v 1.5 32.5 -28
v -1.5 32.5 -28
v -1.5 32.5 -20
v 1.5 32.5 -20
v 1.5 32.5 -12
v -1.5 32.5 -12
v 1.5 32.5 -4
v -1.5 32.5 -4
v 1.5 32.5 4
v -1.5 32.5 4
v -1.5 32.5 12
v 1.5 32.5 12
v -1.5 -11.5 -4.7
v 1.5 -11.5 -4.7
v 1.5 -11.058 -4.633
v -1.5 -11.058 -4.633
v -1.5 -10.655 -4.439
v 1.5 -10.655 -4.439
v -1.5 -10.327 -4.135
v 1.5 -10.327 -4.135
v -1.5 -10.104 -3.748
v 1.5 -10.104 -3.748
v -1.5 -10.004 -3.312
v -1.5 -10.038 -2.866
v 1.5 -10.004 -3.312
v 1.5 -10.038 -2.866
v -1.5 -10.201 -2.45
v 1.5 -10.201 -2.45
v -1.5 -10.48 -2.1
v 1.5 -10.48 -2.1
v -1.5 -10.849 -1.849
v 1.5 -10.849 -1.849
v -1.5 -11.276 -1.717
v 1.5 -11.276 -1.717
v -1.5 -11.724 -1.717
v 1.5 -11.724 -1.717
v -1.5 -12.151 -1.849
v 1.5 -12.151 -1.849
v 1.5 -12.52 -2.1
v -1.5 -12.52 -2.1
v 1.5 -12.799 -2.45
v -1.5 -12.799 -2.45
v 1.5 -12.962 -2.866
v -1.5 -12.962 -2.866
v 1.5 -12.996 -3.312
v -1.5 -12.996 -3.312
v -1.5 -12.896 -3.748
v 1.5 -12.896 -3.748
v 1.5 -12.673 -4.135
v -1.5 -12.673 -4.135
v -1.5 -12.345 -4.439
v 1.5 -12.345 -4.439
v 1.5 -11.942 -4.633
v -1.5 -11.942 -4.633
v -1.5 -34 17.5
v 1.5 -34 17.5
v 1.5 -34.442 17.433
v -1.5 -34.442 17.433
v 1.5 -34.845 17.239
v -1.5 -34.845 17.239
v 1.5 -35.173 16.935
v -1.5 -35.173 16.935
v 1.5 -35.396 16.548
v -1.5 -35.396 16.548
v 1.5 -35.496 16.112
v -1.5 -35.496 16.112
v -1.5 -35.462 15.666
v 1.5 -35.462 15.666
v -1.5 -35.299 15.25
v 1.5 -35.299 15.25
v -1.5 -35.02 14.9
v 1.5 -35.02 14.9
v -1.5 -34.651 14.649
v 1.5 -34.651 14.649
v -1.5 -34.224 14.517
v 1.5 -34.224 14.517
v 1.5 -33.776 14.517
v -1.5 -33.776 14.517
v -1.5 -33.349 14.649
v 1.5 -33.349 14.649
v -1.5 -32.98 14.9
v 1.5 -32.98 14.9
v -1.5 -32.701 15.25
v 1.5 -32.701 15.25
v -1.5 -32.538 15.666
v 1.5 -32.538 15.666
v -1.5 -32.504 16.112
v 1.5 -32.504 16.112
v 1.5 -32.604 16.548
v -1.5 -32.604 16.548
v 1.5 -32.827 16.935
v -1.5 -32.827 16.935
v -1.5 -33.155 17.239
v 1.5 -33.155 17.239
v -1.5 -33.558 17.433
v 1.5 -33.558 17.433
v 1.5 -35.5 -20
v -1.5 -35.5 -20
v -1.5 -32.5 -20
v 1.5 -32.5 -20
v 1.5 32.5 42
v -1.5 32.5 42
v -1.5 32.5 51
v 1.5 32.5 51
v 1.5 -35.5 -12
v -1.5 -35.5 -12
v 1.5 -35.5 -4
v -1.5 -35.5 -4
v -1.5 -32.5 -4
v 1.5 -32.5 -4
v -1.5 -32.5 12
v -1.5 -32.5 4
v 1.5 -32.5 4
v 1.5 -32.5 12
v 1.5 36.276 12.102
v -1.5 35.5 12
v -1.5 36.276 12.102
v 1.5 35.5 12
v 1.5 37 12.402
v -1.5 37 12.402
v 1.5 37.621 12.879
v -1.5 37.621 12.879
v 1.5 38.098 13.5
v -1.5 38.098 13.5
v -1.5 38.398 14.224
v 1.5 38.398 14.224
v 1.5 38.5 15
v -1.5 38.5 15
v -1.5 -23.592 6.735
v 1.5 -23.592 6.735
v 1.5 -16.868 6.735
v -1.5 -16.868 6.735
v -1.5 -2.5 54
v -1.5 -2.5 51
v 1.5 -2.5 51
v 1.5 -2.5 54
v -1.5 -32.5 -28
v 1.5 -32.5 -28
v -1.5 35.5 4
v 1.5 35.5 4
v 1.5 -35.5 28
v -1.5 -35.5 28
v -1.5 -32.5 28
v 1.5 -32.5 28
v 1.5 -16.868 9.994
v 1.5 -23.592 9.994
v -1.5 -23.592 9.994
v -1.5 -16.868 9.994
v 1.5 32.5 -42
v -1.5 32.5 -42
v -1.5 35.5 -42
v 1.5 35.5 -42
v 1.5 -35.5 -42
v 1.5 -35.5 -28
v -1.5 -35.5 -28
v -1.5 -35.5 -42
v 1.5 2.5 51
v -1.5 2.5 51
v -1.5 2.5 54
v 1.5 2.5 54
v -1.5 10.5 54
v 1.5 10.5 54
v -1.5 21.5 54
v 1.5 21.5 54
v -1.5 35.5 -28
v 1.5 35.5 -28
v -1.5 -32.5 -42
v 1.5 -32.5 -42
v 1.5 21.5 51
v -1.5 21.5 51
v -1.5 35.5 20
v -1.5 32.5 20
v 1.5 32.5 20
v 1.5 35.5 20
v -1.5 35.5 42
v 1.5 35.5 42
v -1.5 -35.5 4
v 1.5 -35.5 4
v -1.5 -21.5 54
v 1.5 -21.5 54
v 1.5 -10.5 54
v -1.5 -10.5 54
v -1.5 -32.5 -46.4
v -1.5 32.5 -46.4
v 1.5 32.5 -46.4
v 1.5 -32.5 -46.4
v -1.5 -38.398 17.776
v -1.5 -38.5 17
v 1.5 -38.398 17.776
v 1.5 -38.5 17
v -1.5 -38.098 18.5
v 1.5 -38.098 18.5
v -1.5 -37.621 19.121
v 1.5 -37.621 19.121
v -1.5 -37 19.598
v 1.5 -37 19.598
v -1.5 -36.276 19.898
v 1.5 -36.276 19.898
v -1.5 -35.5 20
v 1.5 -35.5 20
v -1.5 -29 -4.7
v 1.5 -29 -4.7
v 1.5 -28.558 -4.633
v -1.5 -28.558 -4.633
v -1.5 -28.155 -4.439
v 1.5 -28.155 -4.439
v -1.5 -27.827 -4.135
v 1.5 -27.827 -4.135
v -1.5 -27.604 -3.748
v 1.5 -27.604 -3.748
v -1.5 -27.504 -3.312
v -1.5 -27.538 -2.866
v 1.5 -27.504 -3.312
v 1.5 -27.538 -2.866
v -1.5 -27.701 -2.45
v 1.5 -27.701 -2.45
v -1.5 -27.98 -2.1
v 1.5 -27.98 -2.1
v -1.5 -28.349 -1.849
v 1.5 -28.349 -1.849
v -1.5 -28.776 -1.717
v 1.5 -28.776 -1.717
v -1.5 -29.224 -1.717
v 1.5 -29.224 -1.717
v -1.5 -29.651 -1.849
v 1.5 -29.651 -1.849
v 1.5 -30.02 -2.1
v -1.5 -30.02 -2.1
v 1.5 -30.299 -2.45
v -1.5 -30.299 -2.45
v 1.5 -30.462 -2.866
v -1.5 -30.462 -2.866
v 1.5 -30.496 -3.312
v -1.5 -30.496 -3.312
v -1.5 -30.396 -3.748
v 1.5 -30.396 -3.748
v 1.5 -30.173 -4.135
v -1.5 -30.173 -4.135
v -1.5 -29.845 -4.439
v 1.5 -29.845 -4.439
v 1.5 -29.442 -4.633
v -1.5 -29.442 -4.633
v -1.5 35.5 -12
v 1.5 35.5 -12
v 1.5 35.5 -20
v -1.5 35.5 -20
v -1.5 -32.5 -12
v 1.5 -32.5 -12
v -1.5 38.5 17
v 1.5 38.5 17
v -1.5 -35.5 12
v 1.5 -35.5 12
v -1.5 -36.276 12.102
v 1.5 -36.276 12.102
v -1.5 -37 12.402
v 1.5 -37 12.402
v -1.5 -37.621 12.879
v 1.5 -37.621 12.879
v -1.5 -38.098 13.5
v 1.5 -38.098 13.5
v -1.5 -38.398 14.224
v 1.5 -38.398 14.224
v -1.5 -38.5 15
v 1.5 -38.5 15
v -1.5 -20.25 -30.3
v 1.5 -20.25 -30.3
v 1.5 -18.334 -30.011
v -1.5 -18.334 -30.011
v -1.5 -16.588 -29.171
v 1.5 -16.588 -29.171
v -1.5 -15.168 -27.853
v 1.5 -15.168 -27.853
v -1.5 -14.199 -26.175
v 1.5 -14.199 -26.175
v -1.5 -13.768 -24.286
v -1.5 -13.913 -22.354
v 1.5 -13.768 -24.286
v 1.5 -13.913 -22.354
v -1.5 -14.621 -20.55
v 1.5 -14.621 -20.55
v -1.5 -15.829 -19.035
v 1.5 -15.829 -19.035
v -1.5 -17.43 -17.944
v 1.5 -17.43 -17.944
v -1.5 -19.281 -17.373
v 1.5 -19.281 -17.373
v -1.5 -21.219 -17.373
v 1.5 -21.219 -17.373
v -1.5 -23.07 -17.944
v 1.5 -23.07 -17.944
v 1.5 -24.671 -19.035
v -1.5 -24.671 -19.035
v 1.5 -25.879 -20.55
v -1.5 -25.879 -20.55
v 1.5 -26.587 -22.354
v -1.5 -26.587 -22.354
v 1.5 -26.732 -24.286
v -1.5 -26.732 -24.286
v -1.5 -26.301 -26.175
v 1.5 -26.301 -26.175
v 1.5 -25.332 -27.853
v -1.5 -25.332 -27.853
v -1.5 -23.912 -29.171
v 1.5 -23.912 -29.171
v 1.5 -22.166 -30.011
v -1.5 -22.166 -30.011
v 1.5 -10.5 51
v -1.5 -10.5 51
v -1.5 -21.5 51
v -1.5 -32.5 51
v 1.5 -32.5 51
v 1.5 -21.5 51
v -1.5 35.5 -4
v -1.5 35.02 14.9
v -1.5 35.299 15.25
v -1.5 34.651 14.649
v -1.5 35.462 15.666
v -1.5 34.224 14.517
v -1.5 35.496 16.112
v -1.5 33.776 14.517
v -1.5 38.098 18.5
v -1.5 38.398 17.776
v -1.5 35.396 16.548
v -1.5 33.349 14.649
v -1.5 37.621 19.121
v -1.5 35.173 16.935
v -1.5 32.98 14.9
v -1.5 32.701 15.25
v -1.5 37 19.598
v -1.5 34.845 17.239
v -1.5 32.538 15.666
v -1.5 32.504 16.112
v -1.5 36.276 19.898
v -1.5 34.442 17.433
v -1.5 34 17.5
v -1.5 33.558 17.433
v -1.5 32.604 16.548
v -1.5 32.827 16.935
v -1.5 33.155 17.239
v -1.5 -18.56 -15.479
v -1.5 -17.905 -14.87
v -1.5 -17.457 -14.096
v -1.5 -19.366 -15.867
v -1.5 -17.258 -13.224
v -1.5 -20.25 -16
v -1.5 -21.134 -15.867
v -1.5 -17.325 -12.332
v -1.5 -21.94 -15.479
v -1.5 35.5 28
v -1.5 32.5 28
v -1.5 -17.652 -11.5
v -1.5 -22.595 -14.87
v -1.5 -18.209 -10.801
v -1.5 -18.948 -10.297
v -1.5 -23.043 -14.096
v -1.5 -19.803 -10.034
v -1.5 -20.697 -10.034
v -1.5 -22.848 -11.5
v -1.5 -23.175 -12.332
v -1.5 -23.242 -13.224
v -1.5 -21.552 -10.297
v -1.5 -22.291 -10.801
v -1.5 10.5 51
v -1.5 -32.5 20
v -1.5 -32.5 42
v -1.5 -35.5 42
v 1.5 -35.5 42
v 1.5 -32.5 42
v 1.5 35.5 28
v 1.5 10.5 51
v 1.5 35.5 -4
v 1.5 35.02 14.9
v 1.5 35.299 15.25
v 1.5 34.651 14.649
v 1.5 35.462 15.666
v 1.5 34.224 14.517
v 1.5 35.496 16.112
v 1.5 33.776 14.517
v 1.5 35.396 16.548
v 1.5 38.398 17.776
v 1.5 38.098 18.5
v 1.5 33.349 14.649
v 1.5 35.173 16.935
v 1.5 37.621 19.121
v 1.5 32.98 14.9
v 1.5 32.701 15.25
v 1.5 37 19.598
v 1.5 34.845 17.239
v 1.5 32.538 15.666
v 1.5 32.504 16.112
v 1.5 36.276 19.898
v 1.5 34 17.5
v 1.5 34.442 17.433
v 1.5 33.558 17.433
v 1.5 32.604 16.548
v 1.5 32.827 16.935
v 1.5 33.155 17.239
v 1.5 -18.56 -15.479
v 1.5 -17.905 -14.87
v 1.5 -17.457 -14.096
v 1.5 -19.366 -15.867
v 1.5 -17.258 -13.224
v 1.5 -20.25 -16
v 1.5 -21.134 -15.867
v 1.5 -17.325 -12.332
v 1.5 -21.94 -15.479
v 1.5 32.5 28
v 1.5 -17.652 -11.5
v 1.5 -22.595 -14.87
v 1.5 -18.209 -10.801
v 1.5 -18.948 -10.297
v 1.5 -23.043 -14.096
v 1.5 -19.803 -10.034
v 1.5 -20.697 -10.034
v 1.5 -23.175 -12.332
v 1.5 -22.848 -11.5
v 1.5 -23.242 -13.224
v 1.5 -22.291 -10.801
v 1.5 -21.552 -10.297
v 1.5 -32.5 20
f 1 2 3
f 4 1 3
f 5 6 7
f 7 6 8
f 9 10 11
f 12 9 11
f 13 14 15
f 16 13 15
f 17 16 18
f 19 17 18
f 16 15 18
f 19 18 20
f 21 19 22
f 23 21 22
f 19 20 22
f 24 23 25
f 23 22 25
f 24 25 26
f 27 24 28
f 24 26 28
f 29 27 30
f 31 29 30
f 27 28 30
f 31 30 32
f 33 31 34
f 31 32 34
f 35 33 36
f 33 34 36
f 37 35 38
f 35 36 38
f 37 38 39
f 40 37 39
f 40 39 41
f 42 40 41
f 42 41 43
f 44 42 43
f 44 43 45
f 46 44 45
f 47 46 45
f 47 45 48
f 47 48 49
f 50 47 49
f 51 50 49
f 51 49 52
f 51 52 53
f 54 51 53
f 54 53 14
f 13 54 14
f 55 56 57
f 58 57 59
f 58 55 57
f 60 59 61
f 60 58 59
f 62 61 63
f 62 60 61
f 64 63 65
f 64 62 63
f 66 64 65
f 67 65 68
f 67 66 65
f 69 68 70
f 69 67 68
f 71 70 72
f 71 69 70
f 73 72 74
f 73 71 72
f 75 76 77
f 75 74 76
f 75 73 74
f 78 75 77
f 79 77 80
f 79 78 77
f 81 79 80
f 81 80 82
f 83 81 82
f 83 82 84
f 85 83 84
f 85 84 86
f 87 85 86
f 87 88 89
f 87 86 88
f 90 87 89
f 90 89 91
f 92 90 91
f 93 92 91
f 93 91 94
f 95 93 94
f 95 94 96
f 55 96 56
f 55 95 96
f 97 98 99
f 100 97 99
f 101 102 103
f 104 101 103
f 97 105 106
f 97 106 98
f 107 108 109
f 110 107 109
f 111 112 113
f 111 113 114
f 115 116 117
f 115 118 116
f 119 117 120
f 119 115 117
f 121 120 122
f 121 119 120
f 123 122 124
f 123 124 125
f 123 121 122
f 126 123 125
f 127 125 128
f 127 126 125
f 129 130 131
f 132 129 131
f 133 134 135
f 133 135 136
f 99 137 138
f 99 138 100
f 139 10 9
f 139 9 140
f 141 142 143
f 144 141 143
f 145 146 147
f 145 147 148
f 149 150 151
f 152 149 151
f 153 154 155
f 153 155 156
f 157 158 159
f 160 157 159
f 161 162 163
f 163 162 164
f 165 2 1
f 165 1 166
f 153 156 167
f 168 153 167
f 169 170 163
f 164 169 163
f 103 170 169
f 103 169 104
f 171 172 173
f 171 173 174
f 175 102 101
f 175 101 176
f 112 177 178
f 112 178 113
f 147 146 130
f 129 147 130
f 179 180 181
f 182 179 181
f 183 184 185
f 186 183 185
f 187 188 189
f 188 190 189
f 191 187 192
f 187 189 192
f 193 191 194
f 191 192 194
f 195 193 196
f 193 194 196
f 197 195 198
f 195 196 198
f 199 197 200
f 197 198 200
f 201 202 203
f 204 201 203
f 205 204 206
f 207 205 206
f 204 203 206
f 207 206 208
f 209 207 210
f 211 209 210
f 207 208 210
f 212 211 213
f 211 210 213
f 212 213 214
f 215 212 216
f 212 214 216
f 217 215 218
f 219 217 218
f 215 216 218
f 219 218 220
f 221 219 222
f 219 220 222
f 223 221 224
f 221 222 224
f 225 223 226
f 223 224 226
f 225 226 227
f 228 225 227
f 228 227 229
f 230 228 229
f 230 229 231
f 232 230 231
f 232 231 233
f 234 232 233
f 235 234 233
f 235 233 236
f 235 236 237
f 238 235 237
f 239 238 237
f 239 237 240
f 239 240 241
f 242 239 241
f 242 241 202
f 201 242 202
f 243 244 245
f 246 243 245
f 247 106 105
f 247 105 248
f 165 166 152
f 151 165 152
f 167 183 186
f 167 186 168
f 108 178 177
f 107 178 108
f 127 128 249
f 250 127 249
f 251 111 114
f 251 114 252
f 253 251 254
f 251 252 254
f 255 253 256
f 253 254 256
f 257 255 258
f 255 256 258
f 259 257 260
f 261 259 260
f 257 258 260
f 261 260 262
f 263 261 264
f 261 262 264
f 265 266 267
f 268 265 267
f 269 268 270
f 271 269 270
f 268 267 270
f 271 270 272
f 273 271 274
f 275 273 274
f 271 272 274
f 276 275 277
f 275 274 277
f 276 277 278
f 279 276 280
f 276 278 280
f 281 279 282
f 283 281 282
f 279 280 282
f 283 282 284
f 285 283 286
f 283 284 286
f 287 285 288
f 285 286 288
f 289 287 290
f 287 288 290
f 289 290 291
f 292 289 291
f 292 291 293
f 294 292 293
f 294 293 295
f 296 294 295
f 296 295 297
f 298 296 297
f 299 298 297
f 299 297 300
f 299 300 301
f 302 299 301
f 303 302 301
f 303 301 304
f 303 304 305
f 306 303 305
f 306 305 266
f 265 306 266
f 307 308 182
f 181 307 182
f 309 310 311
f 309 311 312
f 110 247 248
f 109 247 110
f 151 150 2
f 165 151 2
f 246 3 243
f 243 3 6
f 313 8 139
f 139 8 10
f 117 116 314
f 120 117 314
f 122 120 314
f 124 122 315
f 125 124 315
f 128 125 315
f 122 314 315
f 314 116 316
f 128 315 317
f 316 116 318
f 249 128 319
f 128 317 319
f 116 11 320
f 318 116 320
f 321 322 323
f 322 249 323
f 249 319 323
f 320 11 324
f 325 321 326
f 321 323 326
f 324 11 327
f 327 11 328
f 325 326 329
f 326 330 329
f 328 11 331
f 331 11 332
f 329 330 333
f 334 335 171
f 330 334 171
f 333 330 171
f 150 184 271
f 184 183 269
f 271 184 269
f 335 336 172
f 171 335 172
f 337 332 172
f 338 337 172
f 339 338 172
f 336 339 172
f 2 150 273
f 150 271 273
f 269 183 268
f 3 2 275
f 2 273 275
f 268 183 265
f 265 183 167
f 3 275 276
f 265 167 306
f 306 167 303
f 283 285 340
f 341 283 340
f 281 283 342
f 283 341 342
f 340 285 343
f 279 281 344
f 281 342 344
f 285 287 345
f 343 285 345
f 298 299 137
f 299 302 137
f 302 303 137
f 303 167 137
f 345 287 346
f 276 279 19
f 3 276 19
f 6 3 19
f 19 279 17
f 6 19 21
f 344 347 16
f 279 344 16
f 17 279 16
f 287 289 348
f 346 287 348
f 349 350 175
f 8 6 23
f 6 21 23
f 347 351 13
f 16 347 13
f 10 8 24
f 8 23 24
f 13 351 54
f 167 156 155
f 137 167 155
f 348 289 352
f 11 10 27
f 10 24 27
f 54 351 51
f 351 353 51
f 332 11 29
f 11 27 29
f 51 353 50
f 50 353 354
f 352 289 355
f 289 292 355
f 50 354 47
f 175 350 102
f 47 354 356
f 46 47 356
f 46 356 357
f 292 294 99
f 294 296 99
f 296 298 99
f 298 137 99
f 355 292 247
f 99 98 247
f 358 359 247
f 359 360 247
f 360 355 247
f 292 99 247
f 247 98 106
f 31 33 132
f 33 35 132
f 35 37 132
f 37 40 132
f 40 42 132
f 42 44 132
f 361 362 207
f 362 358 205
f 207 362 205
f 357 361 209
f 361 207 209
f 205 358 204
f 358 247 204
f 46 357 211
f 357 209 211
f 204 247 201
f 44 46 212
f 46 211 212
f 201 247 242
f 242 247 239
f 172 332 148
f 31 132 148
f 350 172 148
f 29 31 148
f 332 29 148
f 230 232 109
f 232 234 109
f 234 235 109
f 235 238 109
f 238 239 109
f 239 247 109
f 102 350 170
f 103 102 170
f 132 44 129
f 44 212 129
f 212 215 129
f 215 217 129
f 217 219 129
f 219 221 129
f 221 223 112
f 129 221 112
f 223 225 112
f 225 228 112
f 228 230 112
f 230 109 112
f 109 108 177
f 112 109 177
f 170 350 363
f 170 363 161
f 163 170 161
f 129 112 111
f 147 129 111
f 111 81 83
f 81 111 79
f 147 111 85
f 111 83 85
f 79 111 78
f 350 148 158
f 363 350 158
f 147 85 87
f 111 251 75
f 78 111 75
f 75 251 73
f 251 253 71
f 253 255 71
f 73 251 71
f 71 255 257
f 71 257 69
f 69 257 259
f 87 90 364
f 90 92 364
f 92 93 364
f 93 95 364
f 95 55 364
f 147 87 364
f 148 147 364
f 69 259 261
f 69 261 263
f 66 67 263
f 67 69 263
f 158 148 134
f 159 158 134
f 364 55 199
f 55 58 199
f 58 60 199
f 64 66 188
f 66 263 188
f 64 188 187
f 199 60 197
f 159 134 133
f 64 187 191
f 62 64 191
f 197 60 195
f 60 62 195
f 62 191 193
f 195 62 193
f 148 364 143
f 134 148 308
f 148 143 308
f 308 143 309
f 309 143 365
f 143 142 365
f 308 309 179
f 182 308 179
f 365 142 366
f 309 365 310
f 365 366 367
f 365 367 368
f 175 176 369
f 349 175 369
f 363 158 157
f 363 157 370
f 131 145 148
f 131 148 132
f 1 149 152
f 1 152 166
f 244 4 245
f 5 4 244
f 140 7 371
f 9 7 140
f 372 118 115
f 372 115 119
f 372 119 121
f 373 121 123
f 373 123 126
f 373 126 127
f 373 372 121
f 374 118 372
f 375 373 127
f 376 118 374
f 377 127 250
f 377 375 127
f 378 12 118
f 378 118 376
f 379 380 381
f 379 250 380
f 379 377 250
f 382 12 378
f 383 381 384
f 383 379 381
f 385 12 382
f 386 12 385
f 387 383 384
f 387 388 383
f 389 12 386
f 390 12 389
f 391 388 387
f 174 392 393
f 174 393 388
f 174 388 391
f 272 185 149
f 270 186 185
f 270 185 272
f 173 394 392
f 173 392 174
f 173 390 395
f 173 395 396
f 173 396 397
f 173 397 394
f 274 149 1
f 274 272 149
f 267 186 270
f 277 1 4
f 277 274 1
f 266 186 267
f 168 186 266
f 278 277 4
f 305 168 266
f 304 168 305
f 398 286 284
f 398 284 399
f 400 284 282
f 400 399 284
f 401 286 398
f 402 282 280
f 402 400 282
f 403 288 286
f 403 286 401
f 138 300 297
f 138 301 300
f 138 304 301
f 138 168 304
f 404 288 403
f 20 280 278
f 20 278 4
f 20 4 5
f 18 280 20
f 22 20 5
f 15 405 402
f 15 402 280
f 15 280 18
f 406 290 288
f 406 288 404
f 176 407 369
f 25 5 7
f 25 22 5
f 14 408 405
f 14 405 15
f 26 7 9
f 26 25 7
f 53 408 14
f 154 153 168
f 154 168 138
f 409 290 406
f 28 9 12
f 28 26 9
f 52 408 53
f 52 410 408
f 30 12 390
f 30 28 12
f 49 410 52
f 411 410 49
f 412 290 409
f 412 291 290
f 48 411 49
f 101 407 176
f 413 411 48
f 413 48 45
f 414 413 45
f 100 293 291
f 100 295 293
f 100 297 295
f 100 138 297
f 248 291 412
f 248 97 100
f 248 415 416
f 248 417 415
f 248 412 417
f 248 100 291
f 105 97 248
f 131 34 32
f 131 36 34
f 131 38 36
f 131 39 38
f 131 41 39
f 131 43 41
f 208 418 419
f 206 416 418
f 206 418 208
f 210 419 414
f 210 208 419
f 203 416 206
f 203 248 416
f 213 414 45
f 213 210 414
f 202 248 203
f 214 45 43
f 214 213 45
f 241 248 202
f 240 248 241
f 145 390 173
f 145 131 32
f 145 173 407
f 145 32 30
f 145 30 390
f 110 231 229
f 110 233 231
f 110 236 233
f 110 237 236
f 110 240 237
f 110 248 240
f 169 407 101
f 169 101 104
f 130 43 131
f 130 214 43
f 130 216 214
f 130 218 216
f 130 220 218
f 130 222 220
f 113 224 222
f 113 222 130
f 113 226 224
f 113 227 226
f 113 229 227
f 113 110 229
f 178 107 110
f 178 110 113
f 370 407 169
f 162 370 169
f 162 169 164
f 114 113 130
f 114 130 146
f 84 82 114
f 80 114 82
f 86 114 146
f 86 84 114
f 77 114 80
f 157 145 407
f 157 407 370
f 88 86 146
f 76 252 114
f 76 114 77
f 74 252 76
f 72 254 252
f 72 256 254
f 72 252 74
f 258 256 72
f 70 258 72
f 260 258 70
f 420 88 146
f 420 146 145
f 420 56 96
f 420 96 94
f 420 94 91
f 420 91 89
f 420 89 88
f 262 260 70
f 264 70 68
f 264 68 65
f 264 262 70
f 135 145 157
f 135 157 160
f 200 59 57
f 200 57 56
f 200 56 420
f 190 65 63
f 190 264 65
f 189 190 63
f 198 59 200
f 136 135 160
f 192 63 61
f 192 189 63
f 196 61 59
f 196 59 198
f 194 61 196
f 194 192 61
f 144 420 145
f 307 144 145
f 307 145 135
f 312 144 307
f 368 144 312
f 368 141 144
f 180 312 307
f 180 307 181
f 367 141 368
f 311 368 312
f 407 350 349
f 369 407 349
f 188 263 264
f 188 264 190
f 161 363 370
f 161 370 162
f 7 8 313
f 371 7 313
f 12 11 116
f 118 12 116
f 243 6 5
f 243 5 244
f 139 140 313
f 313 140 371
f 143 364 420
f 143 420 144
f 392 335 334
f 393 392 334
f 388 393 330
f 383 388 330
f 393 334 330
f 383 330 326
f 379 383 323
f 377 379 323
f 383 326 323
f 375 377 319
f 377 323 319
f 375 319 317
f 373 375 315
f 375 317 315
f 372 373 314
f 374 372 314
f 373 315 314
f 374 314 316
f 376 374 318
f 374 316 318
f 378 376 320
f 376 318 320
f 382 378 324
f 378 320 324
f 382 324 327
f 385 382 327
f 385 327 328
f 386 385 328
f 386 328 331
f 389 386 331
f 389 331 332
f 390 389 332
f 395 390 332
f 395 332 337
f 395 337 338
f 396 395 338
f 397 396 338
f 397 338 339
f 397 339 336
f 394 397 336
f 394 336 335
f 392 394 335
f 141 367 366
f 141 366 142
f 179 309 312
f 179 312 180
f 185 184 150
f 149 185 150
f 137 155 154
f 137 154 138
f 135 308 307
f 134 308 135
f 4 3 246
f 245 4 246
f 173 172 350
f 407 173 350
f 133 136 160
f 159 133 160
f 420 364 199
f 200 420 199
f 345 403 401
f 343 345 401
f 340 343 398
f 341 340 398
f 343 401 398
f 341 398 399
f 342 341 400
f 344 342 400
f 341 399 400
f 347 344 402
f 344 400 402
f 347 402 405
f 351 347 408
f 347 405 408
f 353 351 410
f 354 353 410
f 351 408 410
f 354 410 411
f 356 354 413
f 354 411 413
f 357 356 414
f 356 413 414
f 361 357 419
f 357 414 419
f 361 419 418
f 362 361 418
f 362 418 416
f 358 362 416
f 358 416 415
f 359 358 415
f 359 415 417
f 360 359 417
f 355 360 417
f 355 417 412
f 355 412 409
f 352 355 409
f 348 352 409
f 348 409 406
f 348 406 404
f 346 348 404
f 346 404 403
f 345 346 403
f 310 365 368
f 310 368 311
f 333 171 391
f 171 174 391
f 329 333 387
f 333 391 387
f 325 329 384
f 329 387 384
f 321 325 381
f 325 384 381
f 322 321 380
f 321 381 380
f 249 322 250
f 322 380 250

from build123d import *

# Parameters (mm, degrees)
CROQUIS1_W               = 108
CROQUIS1_H               = 71
SALIENTE_EXTRUIR1_DEPTH  = 1.5
CROQUIS2_W               = 12
CROQUIS2_H               = 3
CROQUIS2_W_2             = 8
CORTAR_EXTRUIR1_DEPTH    = 3
CROQUIS4_W               = 8
CROQUIS4_H               = 3
SALIENTE_EXTRUIR2_DEPTH  = 3
REDONDEO1_R              = 3
CROQUIS5_R               = 1.5
CORTAR_EXTRUIR2_DEPTH    = 13
REDONDEO1_OF_SIMETR_A2_R = 3
CROQUIS6_W               = 3
CROQUIS6_H               = 14
CROQUIS6_H_2             = 8
CORTAR_EXTRUIR3_DEPTH    = 3
CROQUIS7_W               = 3.217414859
CROQUIS7_H               = 7.6
CORTAR_EXTRUIR4_DEPTH    = 73
CROQUIS8_R               = 6.5
CROQUIS8_R_2             = 3
CROQUIS8_R_3             = 1.5
CROQUIS8_W               = 3.259373519
CROQUIS8_H               = 6.723882433
CORTAR_EXTRUIR5_DEPTH    = 23


with BuildPart() as part:
    # Croquis1 → Saliente-Extruir1 (new, symmetric)
    with BuildSketch(Plane(origin=(0, 0, 0), x_dir=(0, 0, -1), z_dir=(1, 0, 0))):
        Rectangle(CROQUIS1_W, CROQUIS1_H)
    extrude(amount=SALIENTE_EXTRUIR1_DEPTH, both=True)

    # Croquis2 → Cortar-Extruir1 (cut)
    with BuildSketch(Plane.ZY.offset(1.5)):
        with Locations((-48, -34)):
            Rectangle(CROQUIS2_W, CROQUIS2_H)
        with Locations((-24, -34)):
            Rectangle(CROQUIS2_W_2, CROQUIS2_H)
        with Locations((-8, -34)):
            Rectangle(CROQUIS2_W_2, CROQUIS2_H)
        with Locations((8, -34)):
            Rectangle(CROQUIS2_W_2, CROQUIS2_H)
        with Locations((24, -34)):
            Rectangle(CROQUIS2_W_2, CROQUIS2_H)
        with Locations((48, -34)):
            Rectangle(CROQUIS2_W, CROQUIS2_H)
        with Locations((48, 34)):
            Rectangle(CROQUIS2_W, CROQUIS2_H)
        with Locations((24, 34)):
            Rectangle(CROQUIS2_W_2, CROQUIS2_H)
        with Locations((8, 34)):
            Rectangle(CROQUIS2_W_2, CROQUIS2_H)
        with Locations((-8, 34)):
            Rectangle(CROQUIS2_W_2, CROQUIS2_H)
        with Locations((-24, 34)):
            Rectangle(CROQUIS2_W_2, CROQUIS2_H)
        with Locations((-48, 34)):
            Rectangle(CROQUIS2_W, CROQUIS2_H)
    extrude(amount=-CORTAR_EXTRUIR1_DEPTH, mode=Mode.SUBTRACT)

    # Croquis4 → Saliente-Extruir2 (add)
    with BuildSketch(Plane.ZY.offset(1.5)):
        with Locations((16, 37)):
            Rectangle(CROQUIS4_W, CROQUIS4_H)
    saliente_extruir2 = extrude(amount=-SALIENTE_EXTRUIR2_DEPTH)

    # Redondeo1
    redondeo1_edges = [part.edges().sort_by_distance(p)[0] for p in [
        (0, 38.5, 12),
        (0, 38.5, 20),
    ]]
    fillet(redondeo1_edges, radius=REDONDEO1_R)

    # Croquis5 → Cortar-Extruir2 (cut)
    with BuildSketch(Plane.ZY.offset(1.5)):
        with Locations((16, 34)):
            Circle(CROQUIS5_R)
    cortar_extruir2 = extrude(amount=-CORTAR_EXTRUIR2_DEPTH, mode=Mode.SUBTRACT)

    # Simetr_a2: Saliente-Extruir2, Cortar-Extruir2 across plane
    add(saliente_extruir2.mirror(Plane.ZX))
    add(cortar_extruir2.mirror(Plane.ZX), mode=Mode.SUBTRACT)

    # Redondeo1 of Simetr_a2
    redondeo1_of_simetr_a2_edges = [part.edges().sort_by_distance(p)[0] for p in [
        (0, -38.5, 12),
        (0, -38.5, 20),
    ]]
    fillet(redondeo1_of_simetr_a2_edges, radius=REDONDEO1_OF_SIMETR_A2_R)

    # Croquis6 → Cortar-Extruir3 (cut)
    with BuildSketch(Plane.ZY.offset(1.5)):
        with Locations((52.5, -28.5)):
            Rectangle(CROQUIS6_W, CROQUIS6_H)
        with Locations((52.5, -6.5)):
            Rectangle(CROQUIS6_W, CROQUIS6_H_2)
        with Locations((52.5, 6.5)):
            Rectangle(CROQUIS6_W, CROQUIS6_H_2)
        with Locations((52.5, 28.5)):
            Rectangle(CROQUIS6_W, CROQUIS6_H)
    extrude(amount=-CORTAR_EXTRUIR3_DEPTH, mode=Mode.SUBTRACT)

    # Croquis7 → Cortar-Extruir4 (cut)
    with BuildSketch(Plane(origin=(0, 32.5, 0), x_dir=(1, 0, 0), z_dir=(0, 1, 0))):
        with Locations((-0.10870743, 50.2)):
            Rectangle(CROQUIS7_W, CROQUIS7_H)
    extrude(amount=-CORTAR_EXTRUIR4_DEPTH, mode=Mode.SUBTRACT)

    # Croquis8 → Cortar-Extruir5 (cut)
    with BuildSketch(Plane(origin=(1.5, 0, 0), x_dir=(0, 0, -1), z_dir=(1, 0, 0))):
        with Locations((23.8, -20.25)):
            Circle(CROQUIS8_R)
        with Locations((13, -20.25)):
            Circle(CROQUIS8_R_2)
        with Locations((3.2, -11.5)):
            Circle(CROQUIS8_R_3)
        with Locations((3.2, -29)):
            Circle(CROQUIS8_R_3)
        with Locations((-8.36450747, -20.229697644)):
            Rectangle(CROQUIS8_W, CROQUIS8_H)
    extrude(amount=-CORTAR_EXTRUIR5_DEPTH, mode=Mode.SUBTRACT)


solid = part.part
